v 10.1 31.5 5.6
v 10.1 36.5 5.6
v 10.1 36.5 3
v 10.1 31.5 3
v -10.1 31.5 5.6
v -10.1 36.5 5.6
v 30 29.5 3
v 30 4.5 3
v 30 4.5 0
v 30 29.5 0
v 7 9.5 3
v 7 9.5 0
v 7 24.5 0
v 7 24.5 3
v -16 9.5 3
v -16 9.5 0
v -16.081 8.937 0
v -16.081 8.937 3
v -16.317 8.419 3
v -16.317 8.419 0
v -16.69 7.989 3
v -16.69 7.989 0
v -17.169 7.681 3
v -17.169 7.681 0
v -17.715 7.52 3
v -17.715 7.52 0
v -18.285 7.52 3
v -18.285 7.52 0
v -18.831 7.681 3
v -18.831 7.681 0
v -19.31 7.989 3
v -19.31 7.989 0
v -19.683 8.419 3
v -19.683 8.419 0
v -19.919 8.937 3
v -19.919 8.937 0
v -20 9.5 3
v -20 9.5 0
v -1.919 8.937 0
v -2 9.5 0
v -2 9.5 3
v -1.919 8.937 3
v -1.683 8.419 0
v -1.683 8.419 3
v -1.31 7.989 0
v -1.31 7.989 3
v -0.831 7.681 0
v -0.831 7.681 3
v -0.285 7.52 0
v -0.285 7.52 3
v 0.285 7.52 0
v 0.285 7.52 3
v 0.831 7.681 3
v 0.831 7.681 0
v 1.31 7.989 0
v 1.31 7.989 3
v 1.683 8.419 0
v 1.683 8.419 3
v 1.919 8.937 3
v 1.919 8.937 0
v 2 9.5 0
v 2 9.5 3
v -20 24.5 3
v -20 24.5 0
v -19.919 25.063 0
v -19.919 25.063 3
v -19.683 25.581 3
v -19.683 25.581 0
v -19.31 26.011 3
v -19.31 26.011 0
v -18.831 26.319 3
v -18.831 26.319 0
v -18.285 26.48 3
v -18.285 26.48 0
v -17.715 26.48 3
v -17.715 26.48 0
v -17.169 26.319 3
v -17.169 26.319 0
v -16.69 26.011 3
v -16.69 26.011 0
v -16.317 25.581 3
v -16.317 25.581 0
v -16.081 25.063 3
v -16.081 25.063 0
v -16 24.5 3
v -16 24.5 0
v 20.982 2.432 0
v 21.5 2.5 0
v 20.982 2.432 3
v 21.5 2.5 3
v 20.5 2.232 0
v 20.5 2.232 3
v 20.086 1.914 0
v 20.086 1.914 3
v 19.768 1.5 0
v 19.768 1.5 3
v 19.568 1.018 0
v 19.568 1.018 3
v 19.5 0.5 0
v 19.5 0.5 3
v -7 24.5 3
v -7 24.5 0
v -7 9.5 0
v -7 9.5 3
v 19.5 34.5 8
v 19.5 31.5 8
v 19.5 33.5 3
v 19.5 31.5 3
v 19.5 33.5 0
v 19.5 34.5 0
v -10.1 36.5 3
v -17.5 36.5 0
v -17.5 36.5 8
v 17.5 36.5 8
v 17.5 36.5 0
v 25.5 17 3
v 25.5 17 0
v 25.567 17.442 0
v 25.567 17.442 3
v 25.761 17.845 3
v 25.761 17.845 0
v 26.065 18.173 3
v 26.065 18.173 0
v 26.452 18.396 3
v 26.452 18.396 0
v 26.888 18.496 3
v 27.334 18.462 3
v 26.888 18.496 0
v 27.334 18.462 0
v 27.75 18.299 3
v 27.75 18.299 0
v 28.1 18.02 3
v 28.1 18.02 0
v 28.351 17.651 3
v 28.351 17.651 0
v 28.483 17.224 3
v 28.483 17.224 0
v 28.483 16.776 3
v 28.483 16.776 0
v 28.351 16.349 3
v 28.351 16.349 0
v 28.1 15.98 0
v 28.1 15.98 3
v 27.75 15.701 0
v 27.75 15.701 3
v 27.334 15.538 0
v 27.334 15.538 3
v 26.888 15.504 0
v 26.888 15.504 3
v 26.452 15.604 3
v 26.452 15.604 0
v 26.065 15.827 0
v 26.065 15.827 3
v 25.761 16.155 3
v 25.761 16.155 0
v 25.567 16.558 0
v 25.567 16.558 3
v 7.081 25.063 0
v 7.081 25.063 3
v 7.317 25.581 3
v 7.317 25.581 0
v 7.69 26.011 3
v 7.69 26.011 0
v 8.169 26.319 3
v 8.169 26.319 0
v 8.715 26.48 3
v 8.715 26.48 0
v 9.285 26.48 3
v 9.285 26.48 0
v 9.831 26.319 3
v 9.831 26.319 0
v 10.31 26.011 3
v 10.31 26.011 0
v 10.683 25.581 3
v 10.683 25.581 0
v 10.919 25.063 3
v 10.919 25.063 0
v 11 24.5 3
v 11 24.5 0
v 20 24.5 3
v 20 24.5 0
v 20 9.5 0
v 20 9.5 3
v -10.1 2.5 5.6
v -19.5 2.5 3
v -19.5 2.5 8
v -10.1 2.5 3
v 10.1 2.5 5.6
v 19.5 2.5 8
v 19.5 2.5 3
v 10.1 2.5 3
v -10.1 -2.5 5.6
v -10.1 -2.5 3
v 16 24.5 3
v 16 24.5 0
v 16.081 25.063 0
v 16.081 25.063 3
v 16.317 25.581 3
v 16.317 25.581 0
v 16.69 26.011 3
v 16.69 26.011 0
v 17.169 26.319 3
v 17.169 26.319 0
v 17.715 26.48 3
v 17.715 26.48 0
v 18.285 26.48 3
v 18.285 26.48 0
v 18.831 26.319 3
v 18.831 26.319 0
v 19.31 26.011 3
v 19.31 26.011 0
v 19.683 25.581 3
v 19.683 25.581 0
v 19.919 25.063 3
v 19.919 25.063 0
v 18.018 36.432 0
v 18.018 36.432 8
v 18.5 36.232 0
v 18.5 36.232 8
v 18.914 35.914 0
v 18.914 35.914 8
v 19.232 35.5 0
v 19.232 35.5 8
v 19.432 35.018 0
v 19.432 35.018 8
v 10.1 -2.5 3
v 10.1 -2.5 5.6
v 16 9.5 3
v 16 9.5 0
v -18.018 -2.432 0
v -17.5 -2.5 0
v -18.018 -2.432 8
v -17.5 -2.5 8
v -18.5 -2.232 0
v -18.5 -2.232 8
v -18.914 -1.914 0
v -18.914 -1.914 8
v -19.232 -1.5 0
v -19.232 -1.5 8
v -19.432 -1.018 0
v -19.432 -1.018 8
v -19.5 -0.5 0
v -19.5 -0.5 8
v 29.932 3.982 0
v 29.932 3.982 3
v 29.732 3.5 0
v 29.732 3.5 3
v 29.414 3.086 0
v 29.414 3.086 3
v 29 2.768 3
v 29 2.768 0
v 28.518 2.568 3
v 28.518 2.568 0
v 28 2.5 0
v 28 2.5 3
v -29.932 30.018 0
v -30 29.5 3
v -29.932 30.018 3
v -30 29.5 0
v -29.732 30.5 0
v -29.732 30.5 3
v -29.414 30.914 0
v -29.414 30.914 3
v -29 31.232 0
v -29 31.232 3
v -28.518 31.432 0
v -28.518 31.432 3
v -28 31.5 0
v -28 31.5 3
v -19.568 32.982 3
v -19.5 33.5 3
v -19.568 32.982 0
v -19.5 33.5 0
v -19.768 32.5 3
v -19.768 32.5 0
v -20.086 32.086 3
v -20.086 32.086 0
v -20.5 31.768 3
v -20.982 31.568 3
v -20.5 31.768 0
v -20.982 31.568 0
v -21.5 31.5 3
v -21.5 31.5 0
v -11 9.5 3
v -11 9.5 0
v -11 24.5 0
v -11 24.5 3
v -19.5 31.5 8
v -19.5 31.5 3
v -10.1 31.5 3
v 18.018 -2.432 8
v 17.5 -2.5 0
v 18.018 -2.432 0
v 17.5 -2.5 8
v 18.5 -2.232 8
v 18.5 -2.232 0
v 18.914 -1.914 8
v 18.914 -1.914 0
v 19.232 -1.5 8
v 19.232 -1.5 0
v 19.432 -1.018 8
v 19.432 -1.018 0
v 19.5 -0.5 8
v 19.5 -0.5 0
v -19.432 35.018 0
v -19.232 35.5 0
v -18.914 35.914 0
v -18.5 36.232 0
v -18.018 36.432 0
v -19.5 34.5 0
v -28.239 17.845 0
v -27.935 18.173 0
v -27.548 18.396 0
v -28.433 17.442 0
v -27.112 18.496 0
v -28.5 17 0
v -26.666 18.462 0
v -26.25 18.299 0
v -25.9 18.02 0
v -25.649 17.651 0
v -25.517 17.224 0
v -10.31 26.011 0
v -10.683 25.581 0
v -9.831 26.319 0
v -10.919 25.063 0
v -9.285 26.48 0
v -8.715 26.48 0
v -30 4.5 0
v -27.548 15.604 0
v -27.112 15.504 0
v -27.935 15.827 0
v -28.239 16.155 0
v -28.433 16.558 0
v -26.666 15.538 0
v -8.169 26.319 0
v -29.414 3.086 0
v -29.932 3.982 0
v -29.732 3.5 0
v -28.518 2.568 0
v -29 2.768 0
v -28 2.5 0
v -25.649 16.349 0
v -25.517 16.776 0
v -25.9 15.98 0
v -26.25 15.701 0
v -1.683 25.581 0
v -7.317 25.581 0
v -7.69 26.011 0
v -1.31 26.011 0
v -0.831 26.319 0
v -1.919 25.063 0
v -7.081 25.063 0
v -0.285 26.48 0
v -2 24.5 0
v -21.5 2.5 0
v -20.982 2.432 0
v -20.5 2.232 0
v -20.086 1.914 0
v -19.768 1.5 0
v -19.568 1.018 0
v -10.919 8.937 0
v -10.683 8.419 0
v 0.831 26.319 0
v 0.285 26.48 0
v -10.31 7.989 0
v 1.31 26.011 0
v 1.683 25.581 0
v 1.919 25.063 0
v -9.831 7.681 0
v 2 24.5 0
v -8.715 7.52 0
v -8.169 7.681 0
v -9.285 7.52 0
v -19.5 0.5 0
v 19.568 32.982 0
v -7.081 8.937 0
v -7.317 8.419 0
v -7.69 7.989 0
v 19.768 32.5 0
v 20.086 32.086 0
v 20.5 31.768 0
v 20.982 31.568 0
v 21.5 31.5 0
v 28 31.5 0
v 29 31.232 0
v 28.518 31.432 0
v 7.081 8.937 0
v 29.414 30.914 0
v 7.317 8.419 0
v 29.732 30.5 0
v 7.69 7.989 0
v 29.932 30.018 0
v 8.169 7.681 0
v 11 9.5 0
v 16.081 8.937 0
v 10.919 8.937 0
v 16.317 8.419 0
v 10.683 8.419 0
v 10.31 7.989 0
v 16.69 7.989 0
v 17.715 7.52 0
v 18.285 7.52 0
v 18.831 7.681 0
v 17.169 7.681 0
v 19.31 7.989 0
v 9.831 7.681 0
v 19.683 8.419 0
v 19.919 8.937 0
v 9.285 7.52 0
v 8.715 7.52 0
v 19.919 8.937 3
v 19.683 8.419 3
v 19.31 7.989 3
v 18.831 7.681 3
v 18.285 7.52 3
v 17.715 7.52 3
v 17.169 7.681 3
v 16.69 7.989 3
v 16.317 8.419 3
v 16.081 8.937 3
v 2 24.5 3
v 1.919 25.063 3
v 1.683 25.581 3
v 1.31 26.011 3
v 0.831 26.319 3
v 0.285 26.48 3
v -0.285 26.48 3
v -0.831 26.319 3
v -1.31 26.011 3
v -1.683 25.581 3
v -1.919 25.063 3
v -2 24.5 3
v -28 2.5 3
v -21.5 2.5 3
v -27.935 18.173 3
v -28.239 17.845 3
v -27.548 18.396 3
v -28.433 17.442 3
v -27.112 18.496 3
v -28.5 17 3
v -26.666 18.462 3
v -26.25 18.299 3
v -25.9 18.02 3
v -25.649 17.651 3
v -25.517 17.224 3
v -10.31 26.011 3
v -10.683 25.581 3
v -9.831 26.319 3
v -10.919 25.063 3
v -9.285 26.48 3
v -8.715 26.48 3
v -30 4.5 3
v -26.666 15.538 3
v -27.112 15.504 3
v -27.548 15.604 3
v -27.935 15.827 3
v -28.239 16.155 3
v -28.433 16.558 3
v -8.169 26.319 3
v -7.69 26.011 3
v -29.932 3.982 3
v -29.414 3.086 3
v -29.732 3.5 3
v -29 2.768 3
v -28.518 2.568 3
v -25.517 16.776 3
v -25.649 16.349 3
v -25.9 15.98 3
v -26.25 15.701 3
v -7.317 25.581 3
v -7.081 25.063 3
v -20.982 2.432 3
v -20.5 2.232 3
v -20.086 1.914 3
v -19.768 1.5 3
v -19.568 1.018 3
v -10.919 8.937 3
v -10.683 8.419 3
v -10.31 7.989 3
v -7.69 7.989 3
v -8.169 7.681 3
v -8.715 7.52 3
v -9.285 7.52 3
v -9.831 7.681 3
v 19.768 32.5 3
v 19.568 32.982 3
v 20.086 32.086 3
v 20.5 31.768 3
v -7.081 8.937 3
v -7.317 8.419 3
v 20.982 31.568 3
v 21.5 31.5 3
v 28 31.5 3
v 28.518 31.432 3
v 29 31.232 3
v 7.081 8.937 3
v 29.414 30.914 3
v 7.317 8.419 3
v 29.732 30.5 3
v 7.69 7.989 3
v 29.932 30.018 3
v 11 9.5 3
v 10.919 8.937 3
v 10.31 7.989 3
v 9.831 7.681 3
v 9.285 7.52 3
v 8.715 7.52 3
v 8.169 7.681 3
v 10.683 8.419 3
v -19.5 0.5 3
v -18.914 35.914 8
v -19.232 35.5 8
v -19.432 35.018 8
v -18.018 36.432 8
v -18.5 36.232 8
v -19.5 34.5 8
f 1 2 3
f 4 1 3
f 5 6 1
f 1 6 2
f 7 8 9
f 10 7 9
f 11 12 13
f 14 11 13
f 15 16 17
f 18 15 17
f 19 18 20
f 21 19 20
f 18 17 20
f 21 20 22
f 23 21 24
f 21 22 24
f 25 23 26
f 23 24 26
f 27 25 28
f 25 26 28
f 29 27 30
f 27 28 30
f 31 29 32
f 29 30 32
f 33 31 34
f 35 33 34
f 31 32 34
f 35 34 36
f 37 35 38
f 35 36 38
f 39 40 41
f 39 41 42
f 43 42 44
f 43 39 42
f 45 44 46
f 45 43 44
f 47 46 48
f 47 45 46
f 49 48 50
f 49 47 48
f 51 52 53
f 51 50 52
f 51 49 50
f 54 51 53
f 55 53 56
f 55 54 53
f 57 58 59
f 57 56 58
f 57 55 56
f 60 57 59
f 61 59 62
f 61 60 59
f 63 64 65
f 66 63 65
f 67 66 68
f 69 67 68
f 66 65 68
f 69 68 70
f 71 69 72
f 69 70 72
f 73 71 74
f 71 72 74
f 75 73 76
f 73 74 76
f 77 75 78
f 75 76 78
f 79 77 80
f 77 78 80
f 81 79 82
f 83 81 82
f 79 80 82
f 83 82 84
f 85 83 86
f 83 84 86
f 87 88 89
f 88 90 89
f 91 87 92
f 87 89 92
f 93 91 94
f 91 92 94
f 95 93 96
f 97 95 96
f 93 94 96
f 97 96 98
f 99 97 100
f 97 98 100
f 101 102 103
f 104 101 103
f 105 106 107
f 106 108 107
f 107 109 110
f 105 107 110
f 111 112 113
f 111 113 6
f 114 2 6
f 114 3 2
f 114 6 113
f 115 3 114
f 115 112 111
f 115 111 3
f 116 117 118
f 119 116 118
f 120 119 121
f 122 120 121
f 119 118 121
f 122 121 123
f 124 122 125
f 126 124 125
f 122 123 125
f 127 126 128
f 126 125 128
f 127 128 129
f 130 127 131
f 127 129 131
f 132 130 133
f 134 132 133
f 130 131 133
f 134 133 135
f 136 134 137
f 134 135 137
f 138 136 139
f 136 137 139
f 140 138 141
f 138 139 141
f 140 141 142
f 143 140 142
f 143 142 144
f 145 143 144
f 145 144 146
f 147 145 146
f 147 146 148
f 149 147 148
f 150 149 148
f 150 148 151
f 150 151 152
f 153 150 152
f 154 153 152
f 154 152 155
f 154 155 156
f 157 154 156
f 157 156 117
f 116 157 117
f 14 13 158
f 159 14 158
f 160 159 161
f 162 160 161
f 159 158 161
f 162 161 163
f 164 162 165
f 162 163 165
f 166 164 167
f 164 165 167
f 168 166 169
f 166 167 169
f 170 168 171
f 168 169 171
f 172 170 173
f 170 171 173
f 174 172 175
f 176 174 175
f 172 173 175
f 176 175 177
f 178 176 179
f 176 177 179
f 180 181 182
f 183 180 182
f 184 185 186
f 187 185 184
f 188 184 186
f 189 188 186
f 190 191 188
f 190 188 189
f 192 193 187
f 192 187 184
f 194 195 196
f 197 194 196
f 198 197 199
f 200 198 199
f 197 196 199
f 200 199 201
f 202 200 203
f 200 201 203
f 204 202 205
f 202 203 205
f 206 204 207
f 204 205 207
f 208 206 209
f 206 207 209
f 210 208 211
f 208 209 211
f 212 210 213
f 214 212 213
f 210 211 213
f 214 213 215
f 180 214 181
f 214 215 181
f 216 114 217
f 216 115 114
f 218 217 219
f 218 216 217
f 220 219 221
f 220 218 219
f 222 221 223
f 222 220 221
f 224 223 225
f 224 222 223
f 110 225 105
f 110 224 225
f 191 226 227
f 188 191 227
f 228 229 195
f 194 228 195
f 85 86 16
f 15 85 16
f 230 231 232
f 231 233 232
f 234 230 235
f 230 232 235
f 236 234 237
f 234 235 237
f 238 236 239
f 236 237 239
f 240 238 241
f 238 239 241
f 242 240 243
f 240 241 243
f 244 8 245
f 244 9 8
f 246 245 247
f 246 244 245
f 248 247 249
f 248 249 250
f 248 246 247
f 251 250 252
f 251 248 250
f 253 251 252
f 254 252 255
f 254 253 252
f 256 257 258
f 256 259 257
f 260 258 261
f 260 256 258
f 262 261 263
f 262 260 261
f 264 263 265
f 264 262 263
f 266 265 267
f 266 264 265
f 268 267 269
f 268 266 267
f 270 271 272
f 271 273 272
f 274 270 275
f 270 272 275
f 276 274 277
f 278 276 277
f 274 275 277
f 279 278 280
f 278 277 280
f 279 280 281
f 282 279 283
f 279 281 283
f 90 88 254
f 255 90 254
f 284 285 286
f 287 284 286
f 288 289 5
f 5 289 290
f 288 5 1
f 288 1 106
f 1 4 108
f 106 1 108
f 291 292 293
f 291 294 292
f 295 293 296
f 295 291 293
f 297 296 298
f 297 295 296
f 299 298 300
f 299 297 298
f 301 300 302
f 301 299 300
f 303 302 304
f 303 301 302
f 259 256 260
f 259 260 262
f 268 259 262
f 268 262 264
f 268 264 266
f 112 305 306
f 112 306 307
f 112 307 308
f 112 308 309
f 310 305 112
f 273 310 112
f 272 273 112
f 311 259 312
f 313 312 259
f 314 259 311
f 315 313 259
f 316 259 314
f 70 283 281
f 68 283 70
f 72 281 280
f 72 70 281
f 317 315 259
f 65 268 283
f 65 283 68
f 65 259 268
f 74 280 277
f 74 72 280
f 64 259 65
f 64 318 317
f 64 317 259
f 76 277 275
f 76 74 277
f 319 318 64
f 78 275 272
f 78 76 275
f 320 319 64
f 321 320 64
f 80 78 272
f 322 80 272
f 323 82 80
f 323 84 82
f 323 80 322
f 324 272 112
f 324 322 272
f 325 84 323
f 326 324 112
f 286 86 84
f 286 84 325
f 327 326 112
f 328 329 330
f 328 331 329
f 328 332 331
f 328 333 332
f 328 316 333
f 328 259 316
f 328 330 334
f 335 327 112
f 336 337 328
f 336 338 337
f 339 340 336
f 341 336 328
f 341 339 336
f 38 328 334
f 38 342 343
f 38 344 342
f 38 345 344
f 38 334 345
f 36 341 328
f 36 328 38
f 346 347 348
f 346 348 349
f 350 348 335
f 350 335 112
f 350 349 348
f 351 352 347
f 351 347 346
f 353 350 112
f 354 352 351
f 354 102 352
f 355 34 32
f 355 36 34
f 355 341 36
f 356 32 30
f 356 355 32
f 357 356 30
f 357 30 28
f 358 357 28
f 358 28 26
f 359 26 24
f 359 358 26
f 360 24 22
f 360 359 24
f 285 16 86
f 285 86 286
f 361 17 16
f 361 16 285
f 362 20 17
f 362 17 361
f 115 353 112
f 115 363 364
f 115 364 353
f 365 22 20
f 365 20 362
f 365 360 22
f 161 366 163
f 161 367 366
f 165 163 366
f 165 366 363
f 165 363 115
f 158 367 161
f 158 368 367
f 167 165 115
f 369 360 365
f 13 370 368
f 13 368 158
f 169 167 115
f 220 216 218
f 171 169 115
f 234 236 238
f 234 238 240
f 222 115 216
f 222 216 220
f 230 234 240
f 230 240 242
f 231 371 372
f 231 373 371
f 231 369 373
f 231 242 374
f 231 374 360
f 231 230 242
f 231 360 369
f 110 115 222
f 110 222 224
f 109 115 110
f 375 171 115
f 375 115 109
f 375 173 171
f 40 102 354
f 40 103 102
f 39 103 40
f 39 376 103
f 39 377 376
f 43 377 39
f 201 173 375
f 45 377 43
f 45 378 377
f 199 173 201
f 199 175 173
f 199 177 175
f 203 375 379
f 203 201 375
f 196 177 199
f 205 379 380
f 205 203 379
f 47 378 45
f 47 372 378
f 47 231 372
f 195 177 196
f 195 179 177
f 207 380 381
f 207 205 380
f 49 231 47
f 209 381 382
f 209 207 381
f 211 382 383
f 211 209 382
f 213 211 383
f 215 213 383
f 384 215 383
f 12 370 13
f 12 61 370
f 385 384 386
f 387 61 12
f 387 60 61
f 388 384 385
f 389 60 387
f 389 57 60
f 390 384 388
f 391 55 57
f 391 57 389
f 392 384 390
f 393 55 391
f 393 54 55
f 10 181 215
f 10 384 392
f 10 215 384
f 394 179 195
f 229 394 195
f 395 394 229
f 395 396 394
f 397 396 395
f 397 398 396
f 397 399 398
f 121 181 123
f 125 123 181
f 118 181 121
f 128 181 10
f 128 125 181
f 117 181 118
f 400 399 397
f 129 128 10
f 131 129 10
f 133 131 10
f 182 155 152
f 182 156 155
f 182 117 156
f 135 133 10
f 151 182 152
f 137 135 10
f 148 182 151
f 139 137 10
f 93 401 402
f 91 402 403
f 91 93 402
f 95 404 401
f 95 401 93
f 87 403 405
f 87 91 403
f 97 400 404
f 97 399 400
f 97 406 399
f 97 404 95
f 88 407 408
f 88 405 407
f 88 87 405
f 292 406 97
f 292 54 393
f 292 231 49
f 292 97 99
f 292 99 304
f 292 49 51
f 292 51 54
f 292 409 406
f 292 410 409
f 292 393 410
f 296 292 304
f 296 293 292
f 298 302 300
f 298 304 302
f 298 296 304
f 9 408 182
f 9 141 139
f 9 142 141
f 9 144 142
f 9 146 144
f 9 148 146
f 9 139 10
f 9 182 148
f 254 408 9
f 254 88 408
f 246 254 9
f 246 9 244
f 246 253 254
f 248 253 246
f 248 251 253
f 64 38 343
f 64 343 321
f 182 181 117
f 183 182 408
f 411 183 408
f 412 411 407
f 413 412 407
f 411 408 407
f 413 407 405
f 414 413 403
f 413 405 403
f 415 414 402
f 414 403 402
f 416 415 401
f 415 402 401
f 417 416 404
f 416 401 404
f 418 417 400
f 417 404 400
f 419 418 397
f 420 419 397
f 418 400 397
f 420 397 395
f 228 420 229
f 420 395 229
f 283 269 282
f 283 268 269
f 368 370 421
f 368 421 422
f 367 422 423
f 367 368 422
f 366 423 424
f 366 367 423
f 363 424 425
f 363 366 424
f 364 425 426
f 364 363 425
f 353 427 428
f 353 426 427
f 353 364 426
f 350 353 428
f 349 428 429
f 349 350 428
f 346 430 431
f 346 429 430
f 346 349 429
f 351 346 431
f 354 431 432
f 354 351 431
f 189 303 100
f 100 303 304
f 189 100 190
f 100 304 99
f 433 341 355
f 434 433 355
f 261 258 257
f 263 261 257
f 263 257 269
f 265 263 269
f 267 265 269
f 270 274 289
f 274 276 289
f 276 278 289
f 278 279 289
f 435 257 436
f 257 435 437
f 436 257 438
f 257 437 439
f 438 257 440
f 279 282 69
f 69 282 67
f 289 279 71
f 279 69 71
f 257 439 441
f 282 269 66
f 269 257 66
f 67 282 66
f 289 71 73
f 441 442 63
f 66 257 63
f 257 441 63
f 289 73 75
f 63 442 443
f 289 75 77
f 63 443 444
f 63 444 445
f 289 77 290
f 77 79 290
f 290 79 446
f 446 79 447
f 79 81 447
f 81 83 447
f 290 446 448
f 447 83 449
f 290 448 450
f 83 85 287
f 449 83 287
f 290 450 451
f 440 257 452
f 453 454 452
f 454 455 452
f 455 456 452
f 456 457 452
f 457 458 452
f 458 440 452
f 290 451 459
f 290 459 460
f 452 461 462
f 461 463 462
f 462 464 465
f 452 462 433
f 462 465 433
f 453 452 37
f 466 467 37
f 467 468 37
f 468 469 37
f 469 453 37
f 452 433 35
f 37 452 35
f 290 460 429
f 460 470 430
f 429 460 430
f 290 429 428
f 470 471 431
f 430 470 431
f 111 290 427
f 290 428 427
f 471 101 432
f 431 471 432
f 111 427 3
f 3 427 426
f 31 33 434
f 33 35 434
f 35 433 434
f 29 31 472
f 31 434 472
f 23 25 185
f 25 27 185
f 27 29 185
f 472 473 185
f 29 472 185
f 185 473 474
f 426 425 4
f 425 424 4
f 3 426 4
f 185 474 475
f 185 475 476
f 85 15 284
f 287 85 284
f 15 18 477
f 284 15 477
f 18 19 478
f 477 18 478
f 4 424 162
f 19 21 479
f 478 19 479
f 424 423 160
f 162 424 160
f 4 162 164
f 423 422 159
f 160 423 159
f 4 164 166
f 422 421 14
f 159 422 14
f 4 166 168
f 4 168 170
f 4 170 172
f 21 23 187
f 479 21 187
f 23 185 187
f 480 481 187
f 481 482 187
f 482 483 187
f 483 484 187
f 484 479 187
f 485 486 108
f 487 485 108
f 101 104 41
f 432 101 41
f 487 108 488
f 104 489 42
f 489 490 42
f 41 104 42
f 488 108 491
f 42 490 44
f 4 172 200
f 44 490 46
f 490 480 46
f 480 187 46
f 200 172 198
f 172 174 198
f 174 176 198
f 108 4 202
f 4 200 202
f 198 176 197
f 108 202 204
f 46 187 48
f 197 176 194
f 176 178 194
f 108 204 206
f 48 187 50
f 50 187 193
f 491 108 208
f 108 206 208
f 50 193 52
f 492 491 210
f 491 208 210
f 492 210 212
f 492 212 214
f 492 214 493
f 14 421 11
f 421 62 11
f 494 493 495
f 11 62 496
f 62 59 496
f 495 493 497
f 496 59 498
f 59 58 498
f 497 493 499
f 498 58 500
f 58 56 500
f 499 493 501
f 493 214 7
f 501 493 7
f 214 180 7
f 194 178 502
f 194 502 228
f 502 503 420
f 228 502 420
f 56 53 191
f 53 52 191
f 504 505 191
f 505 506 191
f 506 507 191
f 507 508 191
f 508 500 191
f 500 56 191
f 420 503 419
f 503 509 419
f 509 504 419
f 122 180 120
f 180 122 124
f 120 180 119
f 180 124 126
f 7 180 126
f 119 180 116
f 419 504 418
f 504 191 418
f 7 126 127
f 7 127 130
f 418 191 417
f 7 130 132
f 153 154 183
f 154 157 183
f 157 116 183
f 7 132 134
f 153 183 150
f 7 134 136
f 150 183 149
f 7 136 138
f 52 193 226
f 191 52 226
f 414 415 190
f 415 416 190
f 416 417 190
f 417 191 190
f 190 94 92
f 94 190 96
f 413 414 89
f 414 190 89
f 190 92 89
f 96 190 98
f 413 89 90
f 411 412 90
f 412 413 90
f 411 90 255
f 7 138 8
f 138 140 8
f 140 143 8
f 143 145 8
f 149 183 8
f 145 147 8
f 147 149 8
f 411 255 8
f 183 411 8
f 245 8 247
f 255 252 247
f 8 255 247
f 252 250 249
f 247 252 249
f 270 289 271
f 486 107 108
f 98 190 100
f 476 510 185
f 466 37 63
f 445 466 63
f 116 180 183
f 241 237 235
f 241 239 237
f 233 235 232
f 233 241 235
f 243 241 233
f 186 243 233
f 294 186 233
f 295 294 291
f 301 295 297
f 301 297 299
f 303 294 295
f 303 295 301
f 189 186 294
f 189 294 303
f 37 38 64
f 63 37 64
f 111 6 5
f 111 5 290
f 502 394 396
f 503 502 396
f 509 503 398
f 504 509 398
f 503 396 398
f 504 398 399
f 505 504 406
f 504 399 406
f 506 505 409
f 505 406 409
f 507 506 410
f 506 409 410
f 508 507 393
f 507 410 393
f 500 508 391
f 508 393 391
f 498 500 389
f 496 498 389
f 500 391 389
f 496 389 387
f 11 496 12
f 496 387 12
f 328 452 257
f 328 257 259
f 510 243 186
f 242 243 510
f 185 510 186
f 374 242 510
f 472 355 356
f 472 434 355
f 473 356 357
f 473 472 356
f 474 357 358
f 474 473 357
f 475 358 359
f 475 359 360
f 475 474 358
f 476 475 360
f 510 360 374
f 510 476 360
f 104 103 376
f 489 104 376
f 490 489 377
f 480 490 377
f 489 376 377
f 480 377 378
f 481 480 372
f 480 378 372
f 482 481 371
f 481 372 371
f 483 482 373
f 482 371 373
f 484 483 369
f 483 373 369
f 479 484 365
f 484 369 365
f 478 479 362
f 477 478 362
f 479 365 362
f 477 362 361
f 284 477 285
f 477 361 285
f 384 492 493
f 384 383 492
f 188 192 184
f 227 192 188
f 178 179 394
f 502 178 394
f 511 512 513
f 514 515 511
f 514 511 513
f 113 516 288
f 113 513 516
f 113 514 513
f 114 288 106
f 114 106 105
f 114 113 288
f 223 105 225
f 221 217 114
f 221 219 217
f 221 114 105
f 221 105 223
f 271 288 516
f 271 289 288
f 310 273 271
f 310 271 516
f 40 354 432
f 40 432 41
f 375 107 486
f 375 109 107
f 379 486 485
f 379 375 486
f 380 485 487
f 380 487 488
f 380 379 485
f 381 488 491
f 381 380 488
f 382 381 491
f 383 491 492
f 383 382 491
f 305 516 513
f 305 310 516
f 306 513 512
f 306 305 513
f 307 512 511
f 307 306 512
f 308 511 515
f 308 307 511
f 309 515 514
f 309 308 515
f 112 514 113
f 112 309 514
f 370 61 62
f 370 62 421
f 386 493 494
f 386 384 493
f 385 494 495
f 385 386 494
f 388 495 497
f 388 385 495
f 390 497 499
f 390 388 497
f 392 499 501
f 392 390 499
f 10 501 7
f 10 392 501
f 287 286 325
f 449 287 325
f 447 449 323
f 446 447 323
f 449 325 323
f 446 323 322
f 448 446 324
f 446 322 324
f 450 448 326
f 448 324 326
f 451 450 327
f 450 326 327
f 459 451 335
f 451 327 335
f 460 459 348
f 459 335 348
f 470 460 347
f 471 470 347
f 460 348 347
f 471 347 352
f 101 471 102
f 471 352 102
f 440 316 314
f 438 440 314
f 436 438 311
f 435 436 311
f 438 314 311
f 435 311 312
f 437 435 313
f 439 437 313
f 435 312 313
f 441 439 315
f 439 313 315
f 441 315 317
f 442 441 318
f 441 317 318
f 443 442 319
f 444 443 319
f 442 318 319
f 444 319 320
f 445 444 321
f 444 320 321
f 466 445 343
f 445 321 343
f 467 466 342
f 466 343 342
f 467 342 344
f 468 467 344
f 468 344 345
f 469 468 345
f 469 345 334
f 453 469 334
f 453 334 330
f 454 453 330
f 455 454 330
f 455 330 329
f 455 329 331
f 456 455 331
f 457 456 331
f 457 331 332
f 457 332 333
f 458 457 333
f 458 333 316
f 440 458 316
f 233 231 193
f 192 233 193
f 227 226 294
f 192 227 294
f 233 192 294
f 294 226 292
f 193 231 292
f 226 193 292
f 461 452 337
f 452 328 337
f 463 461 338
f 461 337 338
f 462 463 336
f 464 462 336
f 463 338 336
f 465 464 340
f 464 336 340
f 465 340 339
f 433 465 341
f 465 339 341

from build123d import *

# Parameters (mm, degrees)
SKETCH_2_W          = 39
SKETCH_2_H          = 5
EXTRUDE_1_DEPTH     = 8
SKETCH_3_W          = 60
SKETCH_3_H          = 3
EXTRUDE_2_DEPTH     = 29
SKETCH_4_W          = 20.2
SKETCH_4_H          = 2.6
CUT_EXTRUDE_1_DEPTH = 47.043457733
SKETCH_5_R          = 1.5
CUT_EXTRUDE_2_DEPTH = 10
FILLET_1_R          = 2
FILLET_2_R          = 2
SKETCH_6_W          = 39
SKETCH_6_H          = 3
EXTRUDE_3_DEPTH     = 5
SKETCH_7_W          = 39
SKETCH_7_H          = 5
EXTRUDE_4_DEPTH     = 5
SKETCH_8_W          = 20.2
SKETCH_8_H          = 2.6
CUT_EXTRUDE_3_DEPTH = 5
FILLET_3_R          = 2
CUT_EXTRUDE_4_DEPTH = 5


with BuildPart() as part:
    # 草图2 → 凸台-拉伸1 (new body)
    with BuildSketch(Plane.XY):
        Rectangle(SKETCH_2_W, SKETCH_2_H)
    extrude(amount=EXTRUDE_1_DEPTH)

    # 草图3 → 凸台-拉伸2 (add)
    with BuildSketch(Plane(origin=(0, 2.5, 0), x_dir=(1, 0, 0), z_dir=(0, 1, 0))):
        with Locations((0, -1.5)):
            Rectangle(SKETCH_3_W, SKETCH_3_H)
    extrude(amount=EXTRUDE_2_DEPTH)

    # 草图4 → 切除-拉伸1 (cut, through all)
    with BuildSketch(Plane.XZ.offset(2.5)):
        with Locations((0, 4.3)):
            Rectangle(SKETCH_4_W, SKETCH_4_H)
    extrude(amount=-CUT_EXTRUDE_1_DEPTH, mode=Mode.SUBTRACT)

    # 草图5 → 切除-拉伸2 (cut)
    with BuildSketch(Plane(origin=(0, 0, 0), x_dir=(-1, 0, 0), z_dir=(0, 0, -1))):
        with Locations((-27, 17)):
            Circle(SKETCH_5_R)
        with Locations((27, 17)):
            Circle(SKETCH_5_R)
    extrude(amount=-CUT_EXTRUDE_2_DEPTH, mode=Mode.SUBTRACT)

    # 圆角1
    fillet_1_edges = [part.edges().sort_by_distance(p)[0] for p in [
        (-30, 2.5, 1.5),
        (30, 2.5, 1.5),
        (-30, 31.5, 1.5),
        (30, 31.5, 1.5),
        (19.5, -2.5, 4),
        (-19.5, -2.5, 4),
    ]]
    fillet(fillet_1_edges, radius=FILLET_1_R)

    # 圆角2
    fillet_2_edges = [part.edges().sort_by_distance(p)[0] for p in [
        (-19.5, 2.5, 1.5),
        (19.5, 2.5, 1.5),
    ]]
    fillet(fillet_2_edges, radius=FILLET_2_R)

    # 草图6 → 凸台-拉伸3 (add)
    with BuildSketch(Plane(origin=(0, 31.5, 0), x_dir=(1, 0, 0), z_dir=(0, 1, 0))):
        with Locations((0, -1.5)):
            Rectangle(SKETCH_6_W, SKETCH_6_H)
    extrude(amount=EXTRUDE_3_DEPTH)

    # 草图7 → 凸台-拉伸4 (add)
    with BuildSketch(Plane.XY.offset(3)):
        with Locations((0, 34)):
            Rectangle(SKETCH_7_W, SKETCH_7_H)
    extrude(amount=EXTRUDE_4_DEPTH)

    # 草图8 → 切除-拉伸3 (cut)
    with BuildSketch(Plane(origin=(0, 36.5, 0), x_dir=(1, 0, 0), z_dir=(0, 1, 0))):
        with Locations((0, -4.3)):
            Rectangle(SKETCH_8_W, SKETCH_8_H)
    extrude(amount=-CUT_EXTRUDE_3_DEPTH, mode=Mode.SUBTRACT)

    # 圆角3
    fillet_3_edges = [part.edges().sort_by_distance(p)[0] for p in [
        (-19.5, 31.5, 1.5),
        (19.5, 31.5, 1.5),
        (-19.5, 36.5, 4),
        (19.5, 36.5, 4),
    ]]
    fillet(fillet_3_edges, radius=FILLET_3_R)

    # 草图9 → 切除-拉伸4 (cut)
    with BuildSketch(Plane(origin=(0, 0, 0), x_dir=(-1, 0, 0), z_dir=(0, 0, -1))):
        with BuildLine():
            Line((2, 24.5), (2, 9.5))
            ThreePointArc((2, 9.5), (0, 7.5), (-2, 9.5))
            Line((-2, 9.5), (-2, 24.5))
            ThreePointArc((-2, 24.5), (0, 26.5), (2, 24.5))
        make_face()
        with BuildLine():
            Line((7, 24.5), (7, 9.5))
            ThreePointArc((7, 9.5), (9, 7.5), (11, 9.5))
            Line((11, 9.5), (11, 24.5))
            ThreePointArc((11, 24.5), (9, 26.5), (7, 24.5))
        make_face()
        with BuildLine():
            Line((16, 24.5), (16, 9.5))
            ThreePointArc((16, 9.5), (18, 7.5), (20, 9.5))
            Line((20, 9.5), (20, 24.5))
            ThreePointArc((20, 24.5), (18, 26.5), (16, 24.5))
        make_face()
        with BuildLine():
            Line((-11, 24.5), (-11, 9.5))
            ThreePointArc((-11, 9.5), (-9, 7.5), (-7, 9.5))
            Line((-7, 9.5), (-7, 24.5))
            ThreePointArc((-7, 24.5), (-9, 26.5), (-11, 24.5))
        make_face()
        with BuildLine():
            Line((-20, 24.5), (-20, 9.5))
            ThreePointArc((-20, 9.5), (-18, 7.5), (-16, 9.5))
            Line((-16, 9.5), (-16, 24.5))
            ThreePointArc((-16, 24.5), (-18, 26.5), (-20, 24.5))
        make_face()
    extrude(amount=-CUT_EXTRUDE_4_DEPTH, mode=Mode.SUBTRACT)


solid = part.part
